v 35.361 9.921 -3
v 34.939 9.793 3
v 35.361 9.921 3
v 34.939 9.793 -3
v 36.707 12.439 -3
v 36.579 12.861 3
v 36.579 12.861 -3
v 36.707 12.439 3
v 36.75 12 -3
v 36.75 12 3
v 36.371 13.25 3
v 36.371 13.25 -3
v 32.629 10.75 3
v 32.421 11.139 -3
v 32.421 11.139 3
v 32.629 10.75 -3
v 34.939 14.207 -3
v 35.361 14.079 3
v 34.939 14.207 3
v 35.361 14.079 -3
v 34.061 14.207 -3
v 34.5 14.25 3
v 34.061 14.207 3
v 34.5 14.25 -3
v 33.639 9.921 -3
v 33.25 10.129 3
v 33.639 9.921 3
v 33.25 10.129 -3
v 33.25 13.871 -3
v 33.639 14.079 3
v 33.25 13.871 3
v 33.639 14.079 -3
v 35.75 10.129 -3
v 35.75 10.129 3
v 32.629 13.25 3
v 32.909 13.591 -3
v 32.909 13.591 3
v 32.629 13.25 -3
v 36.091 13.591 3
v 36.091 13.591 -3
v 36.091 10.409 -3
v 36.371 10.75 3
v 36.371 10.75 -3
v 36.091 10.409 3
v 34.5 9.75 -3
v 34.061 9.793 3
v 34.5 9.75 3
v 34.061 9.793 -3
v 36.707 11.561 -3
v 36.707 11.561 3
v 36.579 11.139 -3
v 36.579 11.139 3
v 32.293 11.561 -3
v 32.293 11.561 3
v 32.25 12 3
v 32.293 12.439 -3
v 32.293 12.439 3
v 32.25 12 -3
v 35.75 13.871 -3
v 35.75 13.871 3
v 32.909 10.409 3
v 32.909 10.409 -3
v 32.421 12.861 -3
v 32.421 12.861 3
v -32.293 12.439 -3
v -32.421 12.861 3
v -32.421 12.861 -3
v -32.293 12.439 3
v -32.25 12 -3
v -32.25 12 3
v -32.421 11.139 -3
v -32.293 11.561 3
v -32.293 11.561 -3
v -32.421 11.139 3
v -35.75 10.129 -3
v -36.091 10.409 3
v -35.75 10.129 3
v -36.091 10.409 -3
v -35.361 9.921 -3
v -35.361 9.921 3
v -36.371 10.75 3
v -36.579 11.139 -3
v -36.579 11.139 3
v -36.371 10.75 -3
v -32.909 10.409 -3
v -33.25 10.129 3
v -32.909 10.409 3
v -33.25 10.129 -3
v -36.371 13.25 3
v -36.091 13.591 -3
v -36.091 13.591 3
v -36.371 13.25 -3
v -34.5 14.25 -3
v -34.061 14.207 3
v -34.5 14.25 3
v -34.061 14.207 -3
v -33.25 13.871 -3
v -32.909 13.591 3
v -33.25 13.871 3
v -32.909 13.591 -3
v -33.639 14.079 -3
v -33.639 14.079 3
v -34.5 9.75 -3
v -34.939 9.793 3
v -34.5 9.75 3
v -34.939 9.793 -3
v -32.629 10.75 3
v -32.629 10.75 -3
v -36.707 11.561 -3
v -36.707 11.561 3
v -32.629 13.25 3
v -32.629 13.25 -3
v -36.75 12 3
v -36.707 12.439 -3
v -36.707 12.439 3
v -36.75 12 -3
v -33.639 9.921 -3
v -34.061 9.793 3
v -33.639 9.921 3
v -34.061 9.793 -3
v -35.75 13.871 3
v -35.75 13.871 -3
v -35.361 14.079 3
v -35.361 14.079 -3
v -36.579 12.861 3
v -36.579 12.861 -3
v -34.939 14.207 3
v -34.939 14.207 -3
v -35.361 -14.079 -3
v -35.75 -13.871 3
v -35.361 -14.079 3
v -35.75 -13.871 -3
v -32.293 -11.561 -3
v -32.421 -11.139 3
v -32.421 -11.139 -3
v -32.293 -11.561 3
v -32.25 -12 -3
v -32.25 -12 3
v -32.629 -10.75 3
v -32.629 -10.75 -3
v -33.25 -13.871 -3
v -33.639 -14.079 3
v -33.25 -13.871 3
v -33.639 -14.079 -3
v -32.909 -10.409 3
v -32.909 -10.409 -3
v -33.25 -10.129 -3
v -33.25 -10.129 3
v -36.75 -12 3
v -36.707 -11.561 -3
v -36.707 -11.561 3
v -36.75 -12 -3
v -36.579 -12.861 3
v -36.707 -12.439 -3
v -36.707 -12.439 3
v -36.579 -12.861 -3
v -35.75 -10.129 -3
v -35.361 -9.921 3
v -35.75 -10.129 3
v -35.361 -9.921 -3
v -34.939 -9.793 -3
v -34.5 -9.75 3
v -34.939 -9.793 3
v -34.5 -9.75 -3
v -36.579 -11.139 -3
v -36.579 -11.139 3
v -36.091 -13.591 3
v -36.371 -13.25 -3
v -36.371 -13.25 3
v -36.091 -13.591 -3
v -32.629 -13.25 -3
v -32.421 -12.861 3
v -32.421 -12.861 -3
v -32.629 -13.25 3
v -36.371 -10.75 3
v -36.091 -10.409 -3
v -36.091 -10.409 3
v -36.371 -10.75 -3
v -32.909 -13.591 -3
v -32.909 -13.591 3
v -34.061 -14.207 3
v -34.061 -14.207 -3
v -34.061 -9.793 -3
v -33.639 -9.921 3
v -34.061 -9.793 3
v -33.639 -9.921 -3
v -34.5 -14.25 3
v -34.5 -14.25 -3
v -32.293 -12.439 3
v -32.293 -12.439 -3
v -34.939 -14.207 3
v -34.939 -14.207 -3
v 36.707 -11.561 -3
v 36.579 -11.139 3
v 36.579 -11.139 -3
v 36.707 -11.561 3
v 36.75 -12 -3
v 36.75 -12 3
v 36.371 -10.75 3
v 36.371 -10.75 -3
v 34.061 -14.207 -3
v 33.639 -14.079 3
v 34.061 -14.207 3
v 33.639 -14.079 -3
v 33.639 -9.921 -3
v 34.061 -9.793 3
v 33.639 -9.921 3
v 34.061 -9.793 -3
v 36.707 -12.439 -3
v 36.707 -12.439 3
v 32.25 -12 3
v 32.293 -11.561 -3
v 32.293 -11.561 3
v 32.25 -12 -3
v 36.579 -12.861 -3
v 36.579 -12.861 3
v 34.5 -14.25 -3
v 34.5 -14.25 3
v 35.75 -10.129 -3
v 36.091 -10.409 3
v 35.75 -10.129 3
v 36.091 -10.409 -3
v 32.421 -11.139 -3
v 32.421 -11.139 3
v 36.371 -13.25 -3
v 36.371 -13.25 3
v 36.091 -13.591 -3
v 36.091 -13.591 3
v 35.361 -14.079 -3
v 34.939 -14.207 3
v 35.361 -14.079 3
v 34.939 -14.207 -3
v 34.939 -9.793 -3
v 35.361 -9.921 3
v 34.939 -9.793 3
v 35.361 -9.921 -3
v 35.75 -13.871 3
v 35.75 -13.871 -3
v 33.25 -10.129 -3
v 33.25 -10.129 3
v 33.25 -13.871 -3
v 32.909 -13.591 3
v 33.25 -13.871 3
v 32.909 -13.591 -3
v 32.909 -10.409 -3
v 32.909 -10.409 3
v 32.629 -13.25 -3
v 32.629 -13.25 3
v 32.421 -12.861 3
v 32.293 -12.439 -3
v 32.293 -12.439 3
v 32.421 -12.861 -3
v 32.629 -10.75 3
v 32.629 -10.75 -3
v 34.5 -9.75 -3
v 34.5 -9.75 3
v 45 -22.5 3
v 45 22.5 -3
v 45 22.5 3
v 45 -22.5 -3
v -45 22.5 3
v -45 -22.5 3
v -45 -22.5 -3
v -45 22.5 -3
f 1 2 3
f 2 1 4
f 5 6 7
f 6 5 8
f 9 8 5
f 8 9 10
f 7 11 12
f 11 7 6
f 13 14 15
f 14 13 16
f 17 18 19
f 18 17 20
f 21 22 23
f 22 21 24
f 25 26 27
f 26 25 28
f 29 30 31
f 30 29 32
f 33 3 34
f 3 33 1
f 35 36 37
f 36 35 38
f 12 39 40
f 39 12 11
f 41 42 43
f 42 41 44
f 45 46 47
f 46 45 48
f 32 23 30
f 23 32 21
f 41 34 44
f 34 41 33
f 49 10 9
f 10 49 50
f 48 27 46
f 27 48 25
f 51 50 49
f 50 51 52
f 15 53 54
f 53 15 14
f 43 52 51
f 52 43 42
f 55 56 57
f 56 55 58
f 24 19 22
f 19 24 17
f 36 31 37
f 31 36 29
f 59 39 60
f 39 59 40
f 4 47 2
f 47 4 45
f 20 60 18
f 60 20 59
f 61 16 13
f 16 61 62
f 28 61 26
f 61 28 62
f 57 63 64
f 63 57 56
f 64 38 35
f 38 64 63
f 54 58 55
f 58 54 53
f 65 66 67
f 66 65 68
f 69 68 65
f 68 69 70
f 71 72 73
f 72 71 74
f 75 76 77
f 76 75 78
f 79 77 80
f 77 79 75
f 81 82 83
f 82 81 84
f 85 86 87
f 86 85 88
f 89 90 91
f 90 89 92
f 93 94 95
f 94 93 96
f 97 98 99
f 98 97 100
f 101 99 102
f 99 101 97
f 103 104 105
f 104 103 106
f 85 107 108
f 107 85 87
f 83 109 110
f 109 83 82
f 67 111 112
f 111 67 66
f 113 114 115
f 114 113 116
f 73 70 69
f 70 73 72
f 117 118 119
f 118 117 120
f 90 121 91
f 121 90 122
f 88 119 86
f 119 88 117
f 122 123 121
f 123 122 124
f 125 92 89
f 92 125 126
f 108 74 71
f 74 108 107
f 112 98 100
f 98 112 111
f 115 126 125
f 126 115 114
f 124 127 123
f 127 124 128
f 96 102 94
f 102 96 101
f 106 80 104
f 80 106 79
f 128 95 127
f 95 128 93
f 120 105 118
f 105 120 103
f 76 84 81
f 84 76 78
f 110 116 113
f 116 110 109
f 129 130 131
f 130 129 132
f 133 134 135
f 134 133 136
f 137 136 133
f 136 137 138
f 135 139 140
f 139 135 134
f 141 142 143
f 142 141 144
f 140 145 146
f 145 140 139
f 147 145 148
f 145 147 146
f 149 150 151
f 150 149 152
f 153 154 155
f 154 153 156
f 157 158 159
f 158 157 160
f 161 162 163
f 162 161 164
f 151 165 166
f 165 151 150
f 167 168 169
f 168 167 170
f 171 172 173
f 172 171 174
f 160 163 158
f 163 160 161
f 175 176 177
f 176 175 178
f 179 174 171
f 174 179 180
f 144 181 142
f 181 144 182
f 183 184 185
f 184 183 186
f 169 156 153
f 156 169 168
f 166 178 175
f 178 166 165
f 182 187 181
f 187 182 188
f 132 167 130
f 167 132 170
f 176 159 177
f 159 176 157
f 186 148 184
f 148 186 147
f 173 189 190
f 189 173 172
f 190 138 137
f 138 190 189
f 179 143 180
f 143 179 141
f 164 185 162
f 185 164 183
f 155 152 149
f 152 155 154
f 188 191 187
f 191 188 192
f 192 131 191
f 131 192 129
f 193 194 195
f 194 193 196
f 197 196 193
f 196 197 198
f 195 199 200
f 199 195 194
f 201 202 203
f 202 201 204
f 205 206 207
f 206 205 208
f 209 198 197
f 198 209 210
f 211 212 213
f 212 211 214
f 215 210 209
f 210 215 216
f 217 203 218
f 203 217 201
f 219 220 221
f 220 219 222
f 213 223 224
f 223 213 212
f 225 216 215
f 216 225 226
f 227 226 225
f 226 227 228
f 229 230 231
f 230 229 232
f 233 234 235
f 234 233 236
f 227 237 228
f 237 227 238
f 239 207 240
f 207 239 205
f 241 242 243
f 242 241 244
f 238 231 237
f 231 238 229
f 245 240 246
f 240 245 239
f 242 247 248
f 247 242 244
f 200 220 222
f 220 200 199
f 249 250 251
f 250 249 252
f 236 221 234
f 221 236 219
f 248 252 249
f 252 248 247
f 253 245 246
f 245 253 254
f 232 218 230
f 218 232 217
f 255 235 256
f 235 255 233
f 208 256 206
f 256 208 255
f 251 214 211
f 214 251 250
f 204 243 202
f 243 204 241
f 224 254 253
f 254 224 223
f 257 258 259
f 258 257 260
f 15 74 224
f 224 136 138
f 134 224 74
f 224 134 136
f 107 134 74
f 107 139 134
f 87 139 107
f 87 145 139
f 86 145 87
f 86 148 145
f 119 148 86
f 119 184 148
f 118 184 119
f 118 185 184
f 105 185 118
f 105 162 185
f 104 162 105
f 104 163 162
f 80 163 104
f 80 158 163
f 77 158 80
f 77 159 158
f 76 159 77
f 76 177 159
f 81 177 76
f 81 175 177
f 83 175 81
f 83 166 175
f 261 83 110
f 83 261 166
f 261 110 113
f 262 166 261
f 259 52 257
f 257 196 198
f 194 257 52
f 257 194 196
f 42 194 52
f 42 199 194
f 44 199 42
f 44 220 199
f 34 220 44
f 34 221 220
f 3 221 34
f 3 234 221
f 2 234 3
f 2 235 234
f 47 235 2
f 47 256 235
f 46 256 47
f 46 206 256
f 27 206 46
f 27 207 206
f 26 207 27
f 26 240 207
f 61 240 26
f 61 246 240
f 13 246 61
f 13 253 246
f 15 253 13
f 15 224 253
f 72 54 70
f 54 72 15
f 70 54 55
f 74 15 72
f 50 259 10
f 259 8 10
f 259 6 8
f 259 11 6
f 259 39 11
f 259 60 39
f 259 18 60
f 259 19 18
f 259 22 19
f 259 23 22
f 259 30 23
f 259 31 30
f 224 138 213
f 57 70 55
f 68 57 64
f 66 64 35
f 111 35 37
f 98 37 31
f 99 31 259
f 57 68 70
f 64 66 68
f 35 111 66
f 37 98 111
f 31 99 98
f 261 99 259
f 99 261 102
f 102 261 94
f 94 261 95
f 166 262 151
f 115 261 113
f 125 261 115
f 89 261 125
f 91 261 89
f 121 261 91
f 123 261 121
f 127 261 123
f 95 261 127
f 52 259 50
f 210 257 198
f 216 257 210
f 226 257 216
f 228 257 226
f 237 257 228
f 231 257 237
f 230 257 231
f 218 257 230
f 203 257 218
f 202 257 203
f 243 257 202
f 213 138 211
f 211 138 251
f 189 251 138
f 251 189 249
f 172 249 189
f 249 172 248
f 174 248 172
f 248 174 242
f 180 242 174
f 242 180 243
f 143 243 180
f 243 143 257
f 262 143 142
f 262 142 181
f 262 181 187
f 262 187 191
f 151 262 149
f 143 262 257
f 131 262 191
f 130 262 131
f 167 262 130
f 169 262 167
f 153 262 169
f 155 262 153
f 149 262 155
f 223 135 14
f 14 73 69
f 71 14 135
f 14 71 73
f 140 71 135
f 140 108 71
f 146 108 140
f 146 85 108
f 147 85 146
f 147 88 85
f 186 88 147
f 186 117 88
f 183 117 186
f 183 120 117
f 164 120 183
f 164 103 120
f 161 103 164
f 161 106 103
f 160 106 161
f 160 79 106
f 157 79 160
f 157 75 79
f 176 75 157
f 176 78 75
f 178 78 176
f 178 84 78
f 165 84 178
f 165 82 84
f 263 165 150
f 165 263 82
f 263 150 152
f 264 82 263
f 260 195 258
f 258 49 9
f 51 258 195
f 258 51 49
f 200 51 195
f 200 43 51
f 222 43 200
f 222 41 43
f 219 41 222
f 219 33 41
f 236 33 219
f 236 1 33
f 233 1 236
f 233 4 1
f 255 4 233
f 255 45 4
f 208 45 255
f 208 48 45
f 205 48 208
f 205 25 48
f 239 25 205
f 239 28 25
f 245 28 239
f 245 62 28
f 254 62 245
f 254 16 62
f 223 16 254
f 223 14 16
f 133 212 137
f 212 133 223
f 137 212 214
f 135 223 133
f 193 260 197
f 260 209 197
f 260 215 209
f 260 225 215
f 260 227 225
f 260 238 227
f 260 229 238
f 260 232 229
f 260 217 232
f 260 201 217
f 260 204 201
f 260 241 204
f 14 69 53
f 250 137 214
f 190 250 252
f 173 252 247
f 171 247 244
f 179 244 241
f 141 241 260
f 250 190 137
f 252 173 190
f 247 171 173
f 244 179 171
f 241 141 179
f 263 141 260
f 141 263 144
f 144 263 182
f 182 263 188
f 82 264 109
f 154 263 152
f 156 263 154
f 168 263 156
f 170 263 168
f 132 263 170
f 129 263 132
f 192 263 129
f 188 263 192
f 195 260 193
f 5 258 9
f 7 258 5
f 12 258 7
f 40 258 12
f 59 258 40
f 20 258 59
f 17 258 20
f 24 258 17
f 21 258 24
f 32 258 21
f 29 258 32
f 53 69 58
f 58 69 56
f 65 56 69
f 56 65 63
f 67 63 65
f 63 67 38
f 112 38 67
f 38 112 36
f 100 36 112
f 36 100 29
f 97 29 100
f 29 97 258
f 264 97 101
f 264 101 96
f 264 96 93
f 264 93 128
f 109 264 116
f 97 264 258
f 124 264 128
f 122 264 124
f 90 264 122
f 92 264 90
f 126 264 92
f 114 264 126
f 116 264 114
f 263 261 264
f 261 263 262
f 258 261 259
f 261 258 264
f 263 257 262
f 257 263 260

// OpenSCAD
$fn = 32;

// ----------------------------------------------------------------------
// Corner plate 90 x 45 x 6
// 4 holes, centres taken from the edge offset
// ----------------------------------------------------------------------

// --- parameters (mm) ---
plate = [90, 45, 6];  // overall size (x, y, z)
holes = 4;            // number of holes the drawing asks for
hole_d = 4.5;         // hole diameter
edge = 10.5;          // hole centre offset from the plate edge

// --- derived feature positions (mm) ---
corner_x = plate[0] / 2 - edge;  // = 34.5   corner hole X
corner_y = plate[1] / 2 - edge;  // = 12   corner hole Y
feature_centers = [
  [corner_x, corner_y],
  [-corner_x, corner_y],
  [-corner_x, -corner_y],
  [corner_x, -corner_y]
];   // hole centres the loop below drills

// plate outline, every hole drilled through with the same cutters
difference() {
  cube(plate, center = true);
  for (centre = feature_centers)
    translate([centre[0], centre[1], 0])
      cylinder(d = hole_d, h = plate[2] + 2, center = true);
}
